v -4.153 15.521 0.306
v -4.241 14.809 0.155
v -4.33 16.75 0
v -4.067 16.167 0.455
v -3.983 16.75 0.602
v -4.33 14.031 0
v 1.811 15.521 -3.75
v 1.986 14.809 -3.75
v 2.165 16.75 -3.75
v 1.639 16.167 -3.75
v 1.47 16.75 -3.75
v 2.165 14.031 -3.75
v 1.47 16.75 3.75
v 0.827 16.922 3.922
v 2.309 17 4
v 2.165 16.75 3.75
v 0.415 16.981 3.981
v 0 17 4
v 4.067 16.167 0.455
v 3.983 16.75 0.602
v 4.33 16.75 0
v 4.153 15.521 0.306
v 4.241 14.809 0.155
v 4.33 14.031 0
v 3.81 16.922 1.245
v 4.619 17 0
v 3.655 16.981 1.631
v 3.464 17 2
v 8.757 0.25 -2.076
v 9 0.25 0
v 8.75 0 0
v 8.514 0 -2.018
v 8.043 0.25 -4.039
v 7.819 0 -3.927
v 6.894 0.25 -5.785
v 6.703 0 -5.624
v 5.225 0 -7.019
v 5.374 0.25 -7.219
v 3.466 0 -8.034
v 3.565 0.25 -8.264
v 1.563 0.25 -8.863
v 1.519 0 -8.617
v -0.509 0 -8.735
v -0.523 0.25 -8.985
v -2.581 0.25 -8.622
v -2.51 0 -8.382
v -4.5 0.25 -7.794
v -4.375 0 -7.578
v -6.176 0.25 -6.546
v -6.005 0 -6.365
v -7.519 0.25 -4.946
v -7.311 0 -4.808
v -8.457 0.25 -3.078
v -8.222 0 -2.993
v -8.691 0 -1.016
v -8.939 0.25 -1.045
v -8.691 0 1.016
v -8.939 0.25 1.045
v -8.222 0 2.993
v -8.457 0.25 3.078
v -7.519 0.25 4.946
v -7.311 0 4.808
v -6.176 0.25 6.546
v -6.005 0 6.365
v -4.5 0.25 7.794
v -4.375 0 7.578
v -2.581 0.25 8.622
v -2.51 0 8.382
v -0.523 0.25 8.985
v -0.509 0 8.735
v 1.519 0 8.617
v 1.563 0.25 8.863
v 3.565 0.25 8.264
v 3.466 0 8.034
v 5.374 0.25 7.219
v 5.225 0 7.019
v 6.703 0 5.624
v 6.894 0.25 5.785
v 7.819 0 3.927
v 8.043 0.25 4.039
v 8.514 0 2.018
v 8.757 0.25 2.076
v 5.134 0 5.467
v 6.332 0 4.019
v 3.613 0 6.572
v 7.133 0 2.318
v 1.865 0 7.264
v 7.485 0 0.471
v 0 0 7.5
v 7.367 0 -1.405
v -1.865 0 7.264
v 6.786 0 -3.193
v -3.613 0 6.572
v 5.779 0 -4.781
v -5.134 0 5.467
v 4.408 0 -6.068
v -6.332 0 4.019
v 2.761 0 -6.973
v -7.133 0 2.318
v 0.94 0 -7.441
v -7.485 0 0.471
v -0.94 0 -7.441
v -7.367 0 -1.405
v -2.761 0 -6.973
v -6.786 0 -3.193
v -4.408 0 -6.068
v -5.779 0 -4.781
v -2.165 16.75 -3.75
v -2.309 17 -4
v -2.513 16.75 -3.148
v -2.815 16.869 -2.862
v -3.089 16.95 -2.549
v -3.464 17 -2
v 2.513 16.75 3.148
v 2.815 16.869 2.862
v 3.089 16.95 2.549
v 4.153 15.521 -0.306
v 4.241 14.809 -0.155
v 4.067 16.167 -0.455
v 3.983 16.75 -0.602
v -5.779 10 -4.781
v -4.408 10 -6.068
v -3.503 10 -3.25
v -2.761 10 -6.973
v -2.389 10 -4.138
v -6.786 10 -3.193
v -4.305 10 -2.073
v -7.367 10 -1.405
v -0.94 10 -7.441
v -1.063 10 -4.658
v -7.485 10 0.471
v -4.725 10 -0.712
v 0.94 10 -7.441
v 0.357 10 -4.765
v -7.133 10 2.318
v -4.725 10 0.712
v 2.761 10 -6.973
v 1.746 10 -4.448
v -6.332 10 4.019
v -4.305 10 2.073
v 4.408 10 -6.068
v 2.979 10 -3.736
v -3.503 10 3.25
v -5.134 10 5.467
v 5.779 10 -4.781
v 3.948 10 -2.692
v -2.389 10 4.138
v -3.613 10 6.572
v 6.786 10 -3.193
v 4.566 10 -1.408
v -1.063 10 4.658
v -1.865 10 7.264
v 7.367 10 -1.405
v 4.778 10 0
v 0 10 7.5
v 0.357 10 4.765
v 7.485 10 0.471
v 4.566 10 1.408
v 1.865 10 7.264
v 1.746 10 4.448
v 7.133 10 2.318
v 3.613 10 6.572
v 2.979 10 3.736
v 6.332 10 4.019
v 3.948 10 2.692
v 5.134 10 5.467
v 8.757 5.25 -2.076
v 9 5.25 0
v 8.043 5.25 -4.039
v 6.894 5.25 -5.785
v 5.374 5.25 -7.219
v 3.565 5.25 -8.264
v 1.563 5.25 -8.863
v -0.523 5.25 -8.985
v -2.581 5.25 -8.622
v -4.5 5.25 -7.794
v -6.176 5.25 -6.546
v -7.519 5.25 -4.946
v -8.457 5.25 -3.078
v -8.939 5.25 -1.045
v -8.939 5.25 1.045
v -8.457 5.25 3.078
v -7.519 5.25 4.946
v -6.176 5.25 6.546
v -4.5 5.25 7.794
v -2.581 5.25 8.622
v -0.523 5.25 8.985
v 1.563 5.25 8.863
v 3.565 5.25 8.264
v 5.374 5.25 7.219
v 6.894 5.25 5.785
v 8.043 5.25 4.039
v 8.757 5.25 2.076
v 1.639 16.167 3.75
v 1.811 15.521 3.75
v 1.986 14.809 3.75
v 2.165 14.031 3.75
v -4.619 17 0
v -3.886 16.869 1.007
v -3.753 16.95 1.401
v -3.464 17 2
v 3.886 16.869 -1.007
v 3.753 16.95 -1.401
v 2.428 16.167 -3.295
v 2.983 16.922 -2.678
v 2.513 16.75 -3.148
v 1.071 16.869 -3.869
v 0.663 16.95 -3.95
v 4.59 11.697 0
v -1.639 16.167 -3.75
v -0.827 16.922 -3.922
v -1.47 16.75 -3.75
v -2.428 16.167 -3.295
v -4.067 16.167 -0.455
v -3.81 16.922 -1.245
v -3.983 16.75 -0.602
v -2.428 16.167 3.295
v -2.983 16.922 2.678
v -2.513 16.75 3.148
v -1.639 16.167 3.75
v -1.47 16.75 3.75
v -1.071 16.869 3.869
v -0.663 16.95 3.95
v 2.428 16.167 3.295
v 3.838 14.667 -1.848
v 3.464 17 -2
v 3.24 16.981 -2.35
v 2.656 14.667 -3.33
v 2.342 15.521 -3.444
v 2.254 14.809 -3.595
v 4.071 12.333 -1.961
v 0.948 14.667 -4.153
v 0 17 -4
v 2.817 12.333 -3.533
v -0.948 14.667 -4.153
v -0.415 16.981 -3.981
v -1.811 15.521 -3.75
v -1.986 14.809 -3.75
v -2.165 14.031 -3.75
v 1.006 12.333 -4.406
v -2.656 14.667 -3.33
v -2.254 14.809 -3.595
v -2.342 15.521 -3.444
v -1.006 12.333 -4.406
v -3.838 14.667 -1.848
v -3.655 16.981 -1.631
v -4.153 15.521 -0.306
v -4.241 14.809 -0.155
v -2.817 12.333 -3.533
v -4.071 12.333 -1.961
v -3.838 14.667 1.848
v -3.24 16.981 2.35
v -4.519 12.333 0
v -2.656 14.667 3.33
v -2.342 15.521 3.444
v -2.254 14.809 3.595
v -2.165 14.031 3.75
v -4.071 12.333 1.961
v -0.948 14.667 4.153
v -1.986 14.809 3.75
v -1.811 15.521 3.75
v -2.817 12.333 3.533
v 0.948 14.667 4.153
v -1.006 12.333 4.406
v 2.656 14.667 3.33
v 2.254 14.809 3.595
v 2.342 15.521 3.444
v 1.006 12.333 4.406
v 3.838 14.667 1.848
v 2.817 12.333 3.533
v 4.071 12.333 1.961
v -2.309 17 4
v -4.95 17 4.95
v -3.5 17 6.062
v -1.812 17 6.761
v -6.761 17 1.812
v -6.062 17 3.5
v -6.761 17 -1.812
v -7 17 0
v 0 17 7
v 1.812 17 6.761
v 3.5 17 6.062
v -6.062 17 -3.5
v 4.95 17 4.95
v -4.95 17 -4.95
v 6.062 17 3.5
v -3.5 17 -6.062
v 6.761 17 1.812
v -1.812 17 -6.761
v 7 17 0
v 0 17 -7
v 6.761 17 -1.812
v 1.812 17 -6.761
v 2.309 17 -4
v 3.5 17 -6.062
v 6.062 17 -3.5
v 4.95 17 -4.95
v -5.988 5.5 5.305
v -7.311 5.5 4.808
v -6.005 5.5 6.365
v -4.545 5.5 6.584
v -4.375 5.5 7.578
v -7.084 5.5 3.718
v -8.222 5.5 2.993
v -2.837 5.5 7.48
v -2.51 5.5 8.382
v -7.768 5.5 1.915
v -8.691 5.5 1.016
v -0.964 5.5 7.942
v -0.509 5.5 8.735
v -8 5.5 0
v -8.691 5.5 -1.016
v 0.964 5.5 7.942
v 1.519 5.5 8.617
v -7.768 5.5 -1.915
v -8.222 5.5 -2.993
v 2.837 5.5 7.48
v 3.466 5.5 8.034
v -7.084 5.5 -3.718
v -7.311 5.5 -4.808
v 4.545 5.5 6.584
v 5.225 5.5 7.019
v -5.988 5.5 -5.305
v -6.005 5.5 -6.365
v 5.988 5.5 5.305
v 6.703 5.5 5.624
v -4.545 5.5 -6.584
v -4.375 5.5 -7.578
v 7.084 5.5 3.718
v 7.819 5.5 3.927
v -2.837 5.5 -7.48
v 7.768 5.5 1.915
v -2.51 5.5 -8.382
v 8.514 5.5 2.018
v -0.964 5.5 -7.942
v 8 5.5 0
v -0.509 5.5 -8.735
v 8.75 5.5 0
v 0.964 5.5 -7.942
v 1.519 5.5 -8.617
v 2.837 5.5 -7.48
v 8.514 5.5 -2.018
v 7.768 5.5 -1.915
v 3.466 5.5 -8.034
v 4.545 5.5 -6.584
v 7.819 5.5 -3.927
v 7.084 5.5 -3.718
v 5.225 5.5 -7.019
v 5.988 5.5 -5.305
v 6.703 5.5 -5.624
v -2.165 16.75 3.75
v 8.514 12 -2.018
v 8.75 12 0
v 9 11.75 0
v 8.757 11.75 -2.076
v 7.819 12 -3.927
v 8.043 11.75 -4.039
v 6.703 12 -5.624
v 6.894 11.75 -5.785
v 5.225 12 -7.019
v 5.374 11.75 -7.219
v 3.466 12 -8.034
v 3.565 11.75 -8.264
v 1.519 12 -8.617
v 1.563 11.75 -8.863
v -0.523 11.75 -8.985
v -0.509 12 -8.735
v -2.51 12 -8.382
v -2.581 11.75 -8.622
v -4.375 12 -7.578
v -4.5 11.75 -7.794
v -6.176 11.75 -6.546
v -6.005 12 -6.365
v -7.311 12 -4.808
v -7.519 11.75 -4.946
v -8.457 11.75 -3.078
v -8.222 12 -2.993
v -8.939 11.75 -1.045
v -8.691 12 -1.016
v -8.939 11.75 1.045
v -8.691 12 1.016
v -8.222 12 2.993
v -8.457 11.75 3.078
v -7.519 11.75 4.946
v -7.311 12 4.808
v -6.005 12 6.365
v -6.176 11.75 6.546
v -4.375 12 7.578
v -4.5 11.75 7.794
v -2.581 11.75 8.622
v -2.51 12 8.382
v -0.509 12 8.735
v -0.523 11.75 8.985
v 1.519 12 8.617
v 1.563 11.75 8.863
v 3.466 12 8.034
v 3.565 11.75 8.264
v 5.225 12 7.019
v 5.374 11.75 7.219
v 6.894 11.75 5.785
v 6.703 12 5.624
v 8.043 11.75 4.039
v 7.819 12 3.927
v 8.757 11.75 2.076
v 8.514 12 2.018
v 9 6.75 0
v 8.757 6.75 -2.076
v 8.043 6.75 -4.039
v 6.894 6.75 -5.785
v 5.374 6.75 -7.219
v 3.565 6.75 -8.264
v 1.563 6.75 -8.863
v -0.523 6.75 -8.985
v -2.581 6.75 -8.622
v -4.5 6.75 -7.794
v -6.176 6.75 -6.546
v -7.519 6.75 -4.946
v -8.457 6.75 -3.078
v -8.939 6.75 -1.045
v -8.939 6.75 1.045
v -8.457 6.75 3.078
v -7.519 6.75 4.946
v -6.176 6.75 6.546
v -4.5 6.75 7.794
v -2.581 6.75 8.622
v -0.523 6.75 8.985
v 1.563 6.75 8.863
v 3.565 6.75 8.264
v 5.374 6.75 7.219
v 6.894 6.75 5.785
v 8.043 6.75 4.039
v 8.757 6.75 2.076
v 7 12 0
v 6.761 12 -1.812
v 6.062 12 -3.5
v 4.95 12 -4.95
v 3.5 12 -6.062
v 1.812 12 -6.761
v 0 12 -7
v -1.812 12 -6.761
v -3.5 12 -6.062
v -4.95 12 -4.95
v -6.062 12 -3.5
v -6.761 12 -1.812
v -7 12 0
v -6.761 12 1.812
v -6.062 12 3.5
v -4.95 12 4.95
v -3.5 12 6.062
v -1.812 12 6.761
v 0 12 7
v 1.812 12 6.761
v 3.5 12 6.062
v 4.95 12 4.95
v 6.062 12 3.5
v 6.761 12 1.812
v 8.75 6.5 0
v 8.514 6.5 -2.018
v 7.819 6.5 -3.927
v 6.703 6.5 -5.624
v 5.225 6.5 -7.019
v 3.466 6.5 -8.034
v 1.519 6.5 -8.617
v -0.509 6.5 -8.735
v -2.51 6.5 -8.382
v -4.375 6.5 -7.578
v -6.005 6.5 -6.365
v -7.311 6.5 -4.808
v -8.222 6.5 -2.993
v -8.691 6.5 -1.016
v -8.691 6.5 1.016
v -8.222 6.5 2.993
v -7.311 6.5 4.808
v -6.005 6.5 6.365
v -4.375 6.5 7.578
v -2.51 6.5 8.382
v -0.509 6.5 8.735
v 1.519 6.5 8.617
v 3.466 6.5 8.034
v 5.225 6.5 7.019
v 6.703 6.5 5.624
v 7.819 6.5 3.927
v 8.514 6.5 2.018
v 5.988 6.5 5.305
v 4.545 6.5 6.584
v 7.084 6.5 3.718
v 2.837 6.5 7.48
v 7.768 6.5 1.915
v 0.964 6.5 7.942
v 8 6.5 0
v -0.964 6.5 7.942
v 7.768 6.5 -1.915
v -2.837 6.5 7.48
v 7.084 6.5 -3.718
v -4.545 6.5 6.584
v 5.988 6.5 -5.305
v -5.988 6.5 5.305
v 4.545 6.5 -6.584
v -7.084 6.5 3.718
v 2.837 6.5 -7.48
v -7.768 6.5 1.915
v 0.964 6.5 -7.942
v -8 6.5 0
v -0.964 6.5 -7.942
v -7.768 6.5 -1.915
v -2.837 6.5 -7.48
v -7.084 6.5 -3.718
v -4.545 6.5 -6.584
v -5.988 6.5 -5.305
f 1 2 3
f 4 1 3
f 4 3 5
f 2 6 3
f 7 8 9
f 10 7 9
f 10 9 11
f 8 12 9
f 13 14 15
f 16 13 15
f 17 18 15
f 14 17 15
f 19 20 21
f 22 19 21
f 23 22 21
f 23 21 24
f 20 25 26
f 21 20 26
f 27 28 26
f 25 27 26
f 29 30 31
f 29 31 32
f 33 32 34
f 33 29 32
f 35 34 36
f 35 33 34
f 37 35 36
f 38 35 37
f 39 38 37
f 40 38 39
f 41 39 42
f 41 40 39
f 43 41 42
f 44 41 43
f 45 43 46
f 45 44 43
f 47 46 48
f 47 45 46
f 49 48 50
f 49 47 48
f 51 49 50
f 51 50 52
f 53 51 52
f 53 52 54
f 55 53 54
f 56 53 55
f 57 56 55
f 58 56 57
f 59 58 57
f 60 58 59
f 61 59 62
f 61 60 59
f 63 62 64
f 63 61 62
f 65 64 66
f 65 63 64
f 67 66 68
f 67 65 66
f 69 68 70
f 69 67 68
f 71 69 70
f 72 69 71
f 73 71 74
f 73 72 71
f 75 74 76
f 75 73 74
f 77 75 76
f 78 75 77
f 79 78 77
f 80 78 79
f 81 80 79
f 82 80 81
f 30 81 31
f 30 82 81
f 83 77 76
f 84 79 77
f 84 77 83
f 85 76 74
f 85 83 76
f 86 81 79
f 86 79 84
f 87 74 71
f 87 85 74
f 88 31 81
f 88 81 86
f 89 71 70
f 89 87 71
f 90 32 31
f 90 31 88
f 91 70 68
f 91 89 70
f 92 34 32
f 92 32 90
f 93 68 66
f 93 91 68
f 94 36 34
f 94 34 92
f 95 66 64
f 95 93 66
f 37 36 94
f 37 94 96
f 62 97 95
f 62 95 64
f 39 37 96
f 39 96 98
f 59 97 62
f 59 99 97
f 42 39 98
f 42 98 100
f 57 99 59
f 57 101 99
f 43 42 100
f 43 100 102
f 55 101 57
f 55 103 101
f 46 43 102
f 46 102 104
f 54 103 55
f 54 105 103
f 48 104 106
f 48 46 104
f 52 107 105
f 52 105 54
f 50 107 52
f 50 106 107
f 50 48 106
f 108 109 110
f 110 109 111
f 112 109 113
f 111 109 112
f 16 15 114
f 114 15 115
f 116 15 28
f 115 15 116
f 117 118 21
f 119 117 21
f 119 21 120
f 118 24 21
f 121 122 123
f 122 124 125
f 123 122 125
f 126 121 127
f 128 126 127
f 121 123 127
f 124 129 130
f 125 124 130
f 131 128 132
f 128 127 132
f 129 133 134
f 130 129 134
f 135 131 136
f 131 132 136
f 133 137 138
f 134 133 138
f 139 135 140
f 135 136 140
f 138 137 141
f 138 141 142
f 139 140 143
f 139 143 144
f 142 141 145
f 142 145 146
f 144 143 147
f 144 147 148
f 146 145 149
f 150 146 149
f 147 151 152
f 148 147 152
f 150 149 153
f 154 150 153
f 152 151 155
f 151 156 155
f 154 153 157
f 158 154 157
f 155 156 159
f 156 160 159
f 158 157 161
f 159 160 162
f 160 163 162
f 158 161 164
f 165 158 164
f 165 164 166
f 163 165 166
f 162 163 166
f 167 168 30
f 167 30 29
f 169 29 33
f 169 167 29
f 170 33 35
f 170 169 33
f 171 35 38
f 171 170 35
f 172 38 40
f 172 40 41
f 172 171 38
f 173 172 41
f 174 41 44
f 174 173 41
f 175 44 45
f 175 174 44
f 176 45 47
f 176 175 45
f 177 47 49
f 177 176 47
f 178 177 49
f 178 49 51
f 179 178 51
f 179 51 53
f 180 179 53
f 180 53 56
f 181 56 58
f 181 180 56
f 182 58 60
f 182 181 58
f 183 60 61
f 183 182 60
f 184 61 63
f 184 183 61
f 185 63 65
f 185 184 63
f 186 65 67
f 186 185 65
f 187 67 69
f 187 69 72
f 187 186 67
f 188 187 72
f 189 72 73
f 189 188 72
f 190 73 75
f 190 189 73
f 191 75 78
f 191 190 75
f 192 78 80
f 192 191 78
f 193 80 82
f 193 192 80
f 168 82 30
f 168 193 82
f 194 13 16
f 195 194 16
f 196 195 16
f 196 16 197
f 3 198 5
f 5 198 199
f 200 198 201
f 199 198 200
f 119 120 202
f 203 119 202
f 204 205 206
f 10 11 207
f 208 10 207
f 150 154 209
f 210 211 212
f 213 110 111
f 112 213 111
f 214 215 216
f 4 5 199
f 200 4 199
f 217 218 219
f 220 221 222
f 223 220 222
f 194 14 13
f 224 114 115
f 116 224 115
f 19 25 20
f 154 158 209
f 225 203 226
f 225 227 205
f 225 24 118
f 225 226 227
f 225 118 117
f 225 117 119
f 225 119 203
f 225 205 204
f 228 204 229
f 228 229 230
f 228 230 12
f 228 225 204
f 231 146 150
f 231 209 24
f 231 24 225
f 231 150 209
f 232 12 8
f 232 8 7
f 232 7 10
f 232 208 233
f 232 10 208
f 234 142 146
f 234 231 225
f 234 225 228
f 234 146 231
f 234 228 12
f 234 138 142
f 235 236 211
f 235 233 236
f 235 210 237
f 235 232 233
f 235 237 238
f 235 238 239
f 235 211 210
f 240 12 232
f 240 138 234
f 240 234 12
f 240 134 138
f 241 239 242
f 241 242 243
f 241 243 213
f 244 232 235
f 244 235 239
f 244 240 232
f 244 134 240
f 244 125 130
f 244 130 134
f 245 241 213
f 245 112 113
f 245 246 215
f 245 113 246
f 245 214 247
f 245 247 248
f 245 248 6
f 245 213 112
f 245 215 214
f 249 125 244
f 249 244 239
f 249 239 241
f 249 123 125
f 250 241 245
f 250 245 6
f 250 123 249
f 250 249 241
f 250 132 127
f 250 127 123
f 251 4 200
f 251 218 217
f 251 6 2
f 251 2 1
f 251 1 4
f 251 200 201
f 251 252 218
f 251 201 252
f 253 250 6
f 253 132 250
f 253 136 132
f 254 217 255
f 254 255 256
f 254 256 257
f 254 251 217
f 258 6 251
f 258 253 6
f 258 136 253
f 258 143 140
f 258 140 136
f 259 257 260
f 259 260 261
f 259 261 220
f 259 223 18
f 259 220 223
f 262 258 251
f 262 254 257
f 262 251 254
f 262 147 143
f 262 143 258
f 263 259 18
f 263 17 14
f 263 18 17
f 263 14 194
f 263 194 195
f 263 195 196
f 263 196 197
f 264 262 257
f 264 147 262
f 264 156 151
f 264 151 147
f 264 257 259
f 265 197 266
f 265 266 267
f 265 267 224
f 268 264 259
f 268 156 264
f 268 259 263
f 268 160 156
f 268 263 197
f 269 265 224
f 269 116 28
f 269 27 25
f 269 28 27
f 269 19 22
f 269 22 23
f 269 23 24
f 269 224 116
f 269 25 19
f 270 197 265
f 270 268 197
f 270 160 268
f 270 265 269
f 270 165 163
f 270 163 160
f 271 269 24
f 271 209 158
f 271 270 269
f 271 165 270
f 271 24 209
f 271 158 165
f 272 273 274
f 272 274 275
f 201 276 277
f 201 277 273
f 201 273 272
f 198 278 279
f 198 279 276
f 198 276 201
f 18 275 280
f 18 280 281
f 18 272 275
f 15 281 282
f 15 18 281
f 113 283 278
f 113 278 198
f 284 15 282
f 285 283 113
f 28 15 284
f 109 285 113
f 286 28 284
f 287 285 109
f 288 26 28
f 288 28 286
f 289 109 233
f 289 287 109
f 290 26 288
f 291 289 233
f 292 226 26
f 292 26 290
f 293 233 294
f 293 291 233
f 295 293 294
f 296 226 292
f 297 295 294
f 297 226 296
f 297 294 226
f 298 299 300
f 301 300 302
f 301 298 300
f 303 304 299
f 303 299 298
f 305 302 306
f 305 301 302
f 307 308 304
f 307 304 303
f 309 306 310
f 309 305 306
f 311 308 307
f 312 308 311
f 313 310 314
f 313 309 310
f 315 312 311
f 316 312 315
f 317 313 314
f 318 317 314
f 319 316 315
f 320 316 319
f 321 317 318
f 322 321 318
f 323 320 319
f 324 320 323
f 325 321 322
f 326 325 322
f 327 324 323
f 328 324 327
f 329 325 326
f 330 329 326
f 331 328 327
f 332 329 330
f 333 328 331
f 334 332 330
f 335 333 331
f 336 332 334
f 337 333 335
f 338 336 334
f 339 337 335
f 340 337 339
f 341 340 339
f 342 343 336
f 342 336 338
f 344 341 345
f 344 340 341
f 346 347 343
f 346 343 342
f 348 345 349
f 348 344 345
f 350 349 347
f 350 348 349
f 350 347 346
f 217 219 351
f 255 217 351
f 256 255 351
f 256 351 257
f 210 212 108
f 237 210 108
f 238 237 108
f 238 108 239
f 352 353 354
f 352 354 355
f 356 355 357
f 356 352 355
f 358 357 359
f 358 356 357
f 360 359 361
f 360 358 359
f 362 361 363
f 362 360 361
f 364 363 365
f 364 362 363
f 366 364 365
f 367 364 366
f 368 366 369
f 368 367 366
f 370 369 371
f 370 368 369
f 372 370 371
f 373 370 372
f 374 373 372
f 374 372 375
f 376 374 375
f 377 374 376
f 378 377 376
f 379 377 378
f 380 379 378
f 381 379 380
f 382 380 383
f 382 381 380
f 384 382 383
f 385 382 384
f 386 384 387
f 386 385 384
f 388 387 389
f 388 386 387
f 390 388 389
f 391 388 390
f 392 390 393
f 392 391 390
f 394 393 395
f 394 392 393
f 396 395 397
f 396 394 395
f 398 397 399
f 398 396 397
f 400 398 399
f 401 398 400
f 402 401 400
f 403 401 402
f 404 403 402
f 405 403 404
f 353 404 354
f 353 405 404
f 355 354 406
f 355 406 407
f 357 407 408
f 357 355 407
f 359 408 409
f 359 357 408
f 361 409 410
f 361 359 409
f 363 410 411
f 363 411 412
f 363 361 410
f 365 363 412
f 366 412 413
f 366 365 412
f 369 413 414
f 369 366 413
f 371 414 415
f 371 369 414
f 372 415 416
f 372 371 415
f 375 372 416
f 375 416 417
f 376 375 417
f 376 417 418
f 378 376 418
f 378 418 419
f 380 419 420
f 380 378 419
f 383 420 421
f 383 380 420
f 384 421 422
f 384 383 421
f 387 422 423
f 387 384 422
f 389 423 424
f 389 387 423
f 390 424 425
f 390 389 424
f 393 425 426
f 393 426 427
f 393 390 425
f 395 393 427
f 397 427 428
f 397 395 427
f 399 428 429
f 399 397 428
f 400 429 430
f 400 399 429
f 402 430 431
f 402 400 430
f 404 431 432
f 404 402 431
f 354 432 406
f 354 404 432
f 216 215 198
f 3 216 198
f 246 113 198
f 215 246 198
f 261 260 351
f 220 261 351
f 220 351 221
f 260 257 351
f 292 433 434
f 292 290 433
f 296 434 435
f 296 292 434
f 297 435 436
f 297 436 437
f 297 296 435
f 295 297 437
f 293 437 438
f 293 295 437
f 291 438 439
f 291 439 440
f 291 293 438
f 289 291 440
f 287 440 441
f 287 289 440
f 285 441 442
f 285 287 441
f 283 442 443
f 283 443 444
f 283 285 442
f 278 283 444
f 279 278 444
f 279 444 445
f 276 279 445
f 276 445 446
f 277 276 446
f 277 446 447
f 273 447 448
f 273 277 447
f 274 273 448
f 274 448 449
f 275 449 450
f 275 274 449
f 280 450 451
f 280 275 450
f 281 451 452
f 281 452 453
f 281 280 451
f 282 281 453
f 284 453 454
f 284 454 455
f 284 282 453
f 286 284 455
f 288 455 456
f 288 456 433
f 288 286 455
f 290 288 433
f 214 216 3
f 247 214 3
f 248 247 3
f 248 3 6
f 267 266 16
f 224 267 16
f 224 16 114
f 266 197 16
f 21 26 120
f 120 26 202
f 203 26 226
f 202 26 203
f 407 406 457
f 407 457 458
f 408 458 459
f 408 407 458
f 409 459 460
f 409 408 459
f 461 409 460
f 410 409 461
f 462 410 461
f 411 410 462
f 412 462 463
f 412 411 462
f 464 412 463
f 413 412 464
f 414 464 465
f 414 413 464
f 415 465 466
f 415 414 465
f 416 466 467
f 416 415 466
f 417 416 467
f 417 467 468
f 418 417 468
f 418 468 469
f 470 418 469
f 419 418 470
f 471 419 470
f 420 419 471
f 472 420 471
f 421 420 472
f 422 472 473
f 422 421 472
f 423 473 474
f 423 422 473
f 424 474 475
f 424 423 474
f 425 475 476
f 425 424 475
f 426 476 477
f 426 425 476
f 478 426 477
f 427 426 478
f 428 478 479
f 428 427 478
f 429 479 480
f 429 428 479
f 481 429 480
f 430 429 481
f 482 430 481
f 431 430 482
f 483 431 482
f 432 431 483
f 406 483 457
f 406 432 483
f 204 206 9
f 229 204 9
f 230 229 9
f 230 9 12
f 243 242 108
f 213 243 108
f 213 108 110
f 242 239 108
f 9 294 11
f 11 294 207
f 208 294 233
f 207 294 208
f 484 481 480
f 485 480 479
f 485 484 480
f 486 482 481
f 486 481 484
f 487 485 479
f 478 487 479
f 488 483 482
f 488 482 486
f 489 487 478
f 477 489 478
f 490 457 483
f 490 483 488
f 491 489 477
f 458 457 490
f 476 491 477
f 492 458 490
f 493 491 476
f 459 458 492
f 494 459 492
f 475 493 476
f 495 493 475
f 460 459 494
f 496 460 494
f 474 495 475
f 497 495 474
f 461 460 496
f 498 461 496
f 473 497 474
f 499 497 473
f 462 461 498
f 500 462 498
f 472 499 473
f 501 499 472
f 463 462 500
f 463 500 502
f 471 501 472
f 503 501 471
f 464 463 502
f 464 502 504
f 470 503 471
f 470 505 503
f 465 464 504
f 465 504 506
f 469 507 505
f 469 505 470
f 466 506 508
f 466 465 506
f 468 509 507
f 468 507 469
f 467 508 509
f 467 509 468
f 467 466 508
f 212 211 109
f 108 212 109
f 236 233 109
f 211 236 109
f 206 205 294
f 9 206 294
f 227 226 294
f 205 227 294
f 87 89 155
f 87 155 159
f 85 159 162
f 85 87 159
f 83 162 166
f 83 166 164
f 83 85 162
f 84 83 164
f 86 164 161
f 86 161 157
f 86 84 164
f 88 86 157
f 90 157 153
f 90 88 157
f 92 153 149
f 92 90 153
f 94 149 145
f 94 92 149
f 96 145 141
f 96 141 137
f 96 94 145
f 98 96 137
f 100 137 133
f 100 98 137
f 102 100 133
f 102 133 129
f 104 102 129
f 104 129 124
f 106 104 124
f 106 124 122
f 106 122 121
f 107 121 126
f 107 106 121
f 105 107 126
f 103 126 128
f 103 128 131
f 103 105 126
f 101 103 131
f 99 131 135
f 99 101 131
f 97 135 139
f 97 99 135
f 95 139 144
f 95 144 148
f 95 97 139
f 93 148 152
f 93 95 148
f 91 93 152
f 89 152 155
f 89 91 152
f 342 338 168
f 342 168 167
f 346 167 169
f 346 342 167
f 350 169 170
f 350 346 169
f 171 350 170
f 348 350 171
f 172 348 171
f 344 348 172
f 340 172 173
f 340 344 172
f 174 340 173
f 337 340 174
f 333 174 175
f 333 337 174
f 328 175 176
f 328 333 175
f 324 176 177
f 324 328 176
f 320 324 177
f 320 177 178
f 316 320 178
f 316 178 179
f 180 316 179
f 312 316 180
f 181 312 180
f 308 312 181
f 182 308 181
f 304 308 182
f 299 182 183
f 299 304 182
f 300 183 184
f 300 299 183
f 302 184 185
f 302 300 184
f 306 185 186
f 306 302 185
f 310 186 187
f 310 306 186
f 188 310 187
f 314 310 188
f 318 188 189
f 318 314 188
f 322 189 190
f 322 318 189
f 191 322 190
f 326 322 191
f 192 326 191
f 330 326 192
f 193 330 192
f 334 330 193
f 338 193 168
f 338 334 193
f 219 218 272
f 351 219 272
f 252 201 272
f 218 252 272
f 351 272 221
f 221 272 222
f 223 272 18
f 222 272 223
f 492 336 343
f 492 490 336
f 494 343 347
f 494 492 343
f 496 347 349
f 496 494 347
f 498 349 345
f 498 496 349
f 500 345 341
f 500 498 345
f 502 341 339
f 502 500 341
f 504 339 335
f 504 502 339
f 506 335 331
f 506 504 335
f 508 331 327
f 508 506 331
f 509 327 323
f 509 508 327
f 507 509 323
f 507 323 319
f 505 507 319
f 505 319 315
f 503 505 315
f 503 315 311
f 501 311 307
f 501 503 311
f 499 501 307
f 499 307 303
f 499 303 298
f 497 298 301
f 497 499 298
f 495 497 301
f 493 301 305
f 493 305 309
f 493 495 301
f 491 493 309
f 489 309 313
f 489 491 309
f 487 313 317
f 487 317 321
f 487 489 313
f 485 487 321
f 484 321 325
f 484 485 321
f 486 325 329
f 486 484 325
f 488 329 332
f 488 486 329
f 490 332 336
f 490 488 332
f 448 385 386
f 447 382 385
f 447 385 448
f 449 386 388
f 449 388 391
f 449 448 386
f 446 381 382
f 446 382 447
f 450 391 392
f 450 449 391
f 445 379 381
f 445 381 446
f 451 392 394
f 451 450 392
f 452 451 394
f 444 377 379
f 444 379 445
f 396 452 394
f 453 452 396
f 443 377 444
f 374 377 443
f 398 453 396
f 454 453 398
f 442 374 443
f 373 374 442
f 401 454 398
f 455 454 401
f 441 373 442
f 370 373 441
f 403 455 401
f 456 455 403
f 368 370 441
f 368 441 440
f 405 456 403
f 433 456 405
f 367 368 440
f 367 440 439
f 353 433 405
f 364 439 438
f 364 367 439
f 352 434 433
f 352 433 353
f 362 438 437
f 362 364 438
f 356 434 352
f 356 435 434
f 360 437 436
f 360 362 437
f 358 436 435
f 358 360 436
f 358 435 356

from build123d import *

# Parameters (mm, degrees)
FASE1_SIZE                      = 0.25
SCHNITT_LINEAR_AUSTRAGEN1_DEPTH = 18
FASE2_SIZE                      = 0.25
SKIZZE3_R                       = 7.5
SCHNITT_LINEAR_AUSTRAGEN2_DEPTH = 10
SKIZZE5_R                       = 4
SKIZZE4_R                       = 5.890066201


with BuildPart() as part:
    # Skizze1 → Rotation1 (revolve)
    with BuildSketch(Plane.XY):
        Polygon((0, 0), (9, 0), (9, 5.5), (8, 5.5), (8, 6.5), (9, 6.5), (9, 12), (7, 12), (7, 17), (0, 17), (0, 12), (0, 6.5), (0, 5.5), align=None)
    revolve(axis=Axis((0, -292.433279101, 0), (0, 1, 0)))

    # Fase1
    fase1_edges = [part.edges().sort_by_distance(p)[0] for p in [
        (-9, 6.5, 0),
        (-9, 12, 0),
        (-9, 0, 0),
        (-9, 5.5, 0),
    ]]
    chamfer(fase1_edges, length=FASE1_SIZE)

    # Skizze2 → Schnitt-Linear austragen1 (cut, through all)
    with BuildSketch(Plane(origin=(0, 17, 0), x_dir=(1, 0, 0), z_dir=(0, 1, 0))):
        Polygon((2.165063509, -3.75), (4.330127019, 0), (2.165063509, 3.75), (-2.165063509, 3.75), (-4.330127019, 0), (-2.165063509, -3.75), align=None)
    extrude(amount=-SCHNITT_LINEAR_AUSTRAGEN1_DEPTH, mode=Mode.SUBTRACT)

    # Fase2
    fase2_edges = [part.edges().sort_by_distance(p)[0] for p in [
        (0, 17, 3.75),
        (3.247595264, 17, 1.875),
        (3.247595264, 17, -1.875),
        (0, 17, -3.75),
        (-3.247595264, 17, -1.875),
        (-3.247595264, 17, 1.875),
    ]]
    chamfer(fase2_edges, length=FASE2_SIZE)

    # Skizze3 → Schnitt-Linear austragen2 (cut)
    with BuildSketch(Plane(origin=(0, 0, 0), x_dir=(1, 0, 0), z_dir=(0, 1, 0))):
        with Locations(Location((0, 0, 0), (0, 0, 270))):  # turned: the seam where the file's is
            Circle(SKIZZE3_R)
    extrude(amount=SCHNITT_LINEAR_AUSTRAGEN2_DEPTH, mode=Mode.SUBTRACT)

    # Skizze5 → Schnitt-Ausformung2 section 0
    with BuildSketch(Plane(origin=(0, 17, 0), x_dir=(1, 0, 0), z_dir=(0, 1, 0))):
        Circle(SKIZZE5_R)
    # Skizze4 → Schnitt-Ausformung2 section 1
    with BuildSketch(Plane(origin=(0, 0, 0), x_dir=(1, 0, 0), z_dir=(0, 1, 0))):
        Circle(SKIZZE4_R)
    loft(mode=Mode.SUBTRACT)


solid = part.part
